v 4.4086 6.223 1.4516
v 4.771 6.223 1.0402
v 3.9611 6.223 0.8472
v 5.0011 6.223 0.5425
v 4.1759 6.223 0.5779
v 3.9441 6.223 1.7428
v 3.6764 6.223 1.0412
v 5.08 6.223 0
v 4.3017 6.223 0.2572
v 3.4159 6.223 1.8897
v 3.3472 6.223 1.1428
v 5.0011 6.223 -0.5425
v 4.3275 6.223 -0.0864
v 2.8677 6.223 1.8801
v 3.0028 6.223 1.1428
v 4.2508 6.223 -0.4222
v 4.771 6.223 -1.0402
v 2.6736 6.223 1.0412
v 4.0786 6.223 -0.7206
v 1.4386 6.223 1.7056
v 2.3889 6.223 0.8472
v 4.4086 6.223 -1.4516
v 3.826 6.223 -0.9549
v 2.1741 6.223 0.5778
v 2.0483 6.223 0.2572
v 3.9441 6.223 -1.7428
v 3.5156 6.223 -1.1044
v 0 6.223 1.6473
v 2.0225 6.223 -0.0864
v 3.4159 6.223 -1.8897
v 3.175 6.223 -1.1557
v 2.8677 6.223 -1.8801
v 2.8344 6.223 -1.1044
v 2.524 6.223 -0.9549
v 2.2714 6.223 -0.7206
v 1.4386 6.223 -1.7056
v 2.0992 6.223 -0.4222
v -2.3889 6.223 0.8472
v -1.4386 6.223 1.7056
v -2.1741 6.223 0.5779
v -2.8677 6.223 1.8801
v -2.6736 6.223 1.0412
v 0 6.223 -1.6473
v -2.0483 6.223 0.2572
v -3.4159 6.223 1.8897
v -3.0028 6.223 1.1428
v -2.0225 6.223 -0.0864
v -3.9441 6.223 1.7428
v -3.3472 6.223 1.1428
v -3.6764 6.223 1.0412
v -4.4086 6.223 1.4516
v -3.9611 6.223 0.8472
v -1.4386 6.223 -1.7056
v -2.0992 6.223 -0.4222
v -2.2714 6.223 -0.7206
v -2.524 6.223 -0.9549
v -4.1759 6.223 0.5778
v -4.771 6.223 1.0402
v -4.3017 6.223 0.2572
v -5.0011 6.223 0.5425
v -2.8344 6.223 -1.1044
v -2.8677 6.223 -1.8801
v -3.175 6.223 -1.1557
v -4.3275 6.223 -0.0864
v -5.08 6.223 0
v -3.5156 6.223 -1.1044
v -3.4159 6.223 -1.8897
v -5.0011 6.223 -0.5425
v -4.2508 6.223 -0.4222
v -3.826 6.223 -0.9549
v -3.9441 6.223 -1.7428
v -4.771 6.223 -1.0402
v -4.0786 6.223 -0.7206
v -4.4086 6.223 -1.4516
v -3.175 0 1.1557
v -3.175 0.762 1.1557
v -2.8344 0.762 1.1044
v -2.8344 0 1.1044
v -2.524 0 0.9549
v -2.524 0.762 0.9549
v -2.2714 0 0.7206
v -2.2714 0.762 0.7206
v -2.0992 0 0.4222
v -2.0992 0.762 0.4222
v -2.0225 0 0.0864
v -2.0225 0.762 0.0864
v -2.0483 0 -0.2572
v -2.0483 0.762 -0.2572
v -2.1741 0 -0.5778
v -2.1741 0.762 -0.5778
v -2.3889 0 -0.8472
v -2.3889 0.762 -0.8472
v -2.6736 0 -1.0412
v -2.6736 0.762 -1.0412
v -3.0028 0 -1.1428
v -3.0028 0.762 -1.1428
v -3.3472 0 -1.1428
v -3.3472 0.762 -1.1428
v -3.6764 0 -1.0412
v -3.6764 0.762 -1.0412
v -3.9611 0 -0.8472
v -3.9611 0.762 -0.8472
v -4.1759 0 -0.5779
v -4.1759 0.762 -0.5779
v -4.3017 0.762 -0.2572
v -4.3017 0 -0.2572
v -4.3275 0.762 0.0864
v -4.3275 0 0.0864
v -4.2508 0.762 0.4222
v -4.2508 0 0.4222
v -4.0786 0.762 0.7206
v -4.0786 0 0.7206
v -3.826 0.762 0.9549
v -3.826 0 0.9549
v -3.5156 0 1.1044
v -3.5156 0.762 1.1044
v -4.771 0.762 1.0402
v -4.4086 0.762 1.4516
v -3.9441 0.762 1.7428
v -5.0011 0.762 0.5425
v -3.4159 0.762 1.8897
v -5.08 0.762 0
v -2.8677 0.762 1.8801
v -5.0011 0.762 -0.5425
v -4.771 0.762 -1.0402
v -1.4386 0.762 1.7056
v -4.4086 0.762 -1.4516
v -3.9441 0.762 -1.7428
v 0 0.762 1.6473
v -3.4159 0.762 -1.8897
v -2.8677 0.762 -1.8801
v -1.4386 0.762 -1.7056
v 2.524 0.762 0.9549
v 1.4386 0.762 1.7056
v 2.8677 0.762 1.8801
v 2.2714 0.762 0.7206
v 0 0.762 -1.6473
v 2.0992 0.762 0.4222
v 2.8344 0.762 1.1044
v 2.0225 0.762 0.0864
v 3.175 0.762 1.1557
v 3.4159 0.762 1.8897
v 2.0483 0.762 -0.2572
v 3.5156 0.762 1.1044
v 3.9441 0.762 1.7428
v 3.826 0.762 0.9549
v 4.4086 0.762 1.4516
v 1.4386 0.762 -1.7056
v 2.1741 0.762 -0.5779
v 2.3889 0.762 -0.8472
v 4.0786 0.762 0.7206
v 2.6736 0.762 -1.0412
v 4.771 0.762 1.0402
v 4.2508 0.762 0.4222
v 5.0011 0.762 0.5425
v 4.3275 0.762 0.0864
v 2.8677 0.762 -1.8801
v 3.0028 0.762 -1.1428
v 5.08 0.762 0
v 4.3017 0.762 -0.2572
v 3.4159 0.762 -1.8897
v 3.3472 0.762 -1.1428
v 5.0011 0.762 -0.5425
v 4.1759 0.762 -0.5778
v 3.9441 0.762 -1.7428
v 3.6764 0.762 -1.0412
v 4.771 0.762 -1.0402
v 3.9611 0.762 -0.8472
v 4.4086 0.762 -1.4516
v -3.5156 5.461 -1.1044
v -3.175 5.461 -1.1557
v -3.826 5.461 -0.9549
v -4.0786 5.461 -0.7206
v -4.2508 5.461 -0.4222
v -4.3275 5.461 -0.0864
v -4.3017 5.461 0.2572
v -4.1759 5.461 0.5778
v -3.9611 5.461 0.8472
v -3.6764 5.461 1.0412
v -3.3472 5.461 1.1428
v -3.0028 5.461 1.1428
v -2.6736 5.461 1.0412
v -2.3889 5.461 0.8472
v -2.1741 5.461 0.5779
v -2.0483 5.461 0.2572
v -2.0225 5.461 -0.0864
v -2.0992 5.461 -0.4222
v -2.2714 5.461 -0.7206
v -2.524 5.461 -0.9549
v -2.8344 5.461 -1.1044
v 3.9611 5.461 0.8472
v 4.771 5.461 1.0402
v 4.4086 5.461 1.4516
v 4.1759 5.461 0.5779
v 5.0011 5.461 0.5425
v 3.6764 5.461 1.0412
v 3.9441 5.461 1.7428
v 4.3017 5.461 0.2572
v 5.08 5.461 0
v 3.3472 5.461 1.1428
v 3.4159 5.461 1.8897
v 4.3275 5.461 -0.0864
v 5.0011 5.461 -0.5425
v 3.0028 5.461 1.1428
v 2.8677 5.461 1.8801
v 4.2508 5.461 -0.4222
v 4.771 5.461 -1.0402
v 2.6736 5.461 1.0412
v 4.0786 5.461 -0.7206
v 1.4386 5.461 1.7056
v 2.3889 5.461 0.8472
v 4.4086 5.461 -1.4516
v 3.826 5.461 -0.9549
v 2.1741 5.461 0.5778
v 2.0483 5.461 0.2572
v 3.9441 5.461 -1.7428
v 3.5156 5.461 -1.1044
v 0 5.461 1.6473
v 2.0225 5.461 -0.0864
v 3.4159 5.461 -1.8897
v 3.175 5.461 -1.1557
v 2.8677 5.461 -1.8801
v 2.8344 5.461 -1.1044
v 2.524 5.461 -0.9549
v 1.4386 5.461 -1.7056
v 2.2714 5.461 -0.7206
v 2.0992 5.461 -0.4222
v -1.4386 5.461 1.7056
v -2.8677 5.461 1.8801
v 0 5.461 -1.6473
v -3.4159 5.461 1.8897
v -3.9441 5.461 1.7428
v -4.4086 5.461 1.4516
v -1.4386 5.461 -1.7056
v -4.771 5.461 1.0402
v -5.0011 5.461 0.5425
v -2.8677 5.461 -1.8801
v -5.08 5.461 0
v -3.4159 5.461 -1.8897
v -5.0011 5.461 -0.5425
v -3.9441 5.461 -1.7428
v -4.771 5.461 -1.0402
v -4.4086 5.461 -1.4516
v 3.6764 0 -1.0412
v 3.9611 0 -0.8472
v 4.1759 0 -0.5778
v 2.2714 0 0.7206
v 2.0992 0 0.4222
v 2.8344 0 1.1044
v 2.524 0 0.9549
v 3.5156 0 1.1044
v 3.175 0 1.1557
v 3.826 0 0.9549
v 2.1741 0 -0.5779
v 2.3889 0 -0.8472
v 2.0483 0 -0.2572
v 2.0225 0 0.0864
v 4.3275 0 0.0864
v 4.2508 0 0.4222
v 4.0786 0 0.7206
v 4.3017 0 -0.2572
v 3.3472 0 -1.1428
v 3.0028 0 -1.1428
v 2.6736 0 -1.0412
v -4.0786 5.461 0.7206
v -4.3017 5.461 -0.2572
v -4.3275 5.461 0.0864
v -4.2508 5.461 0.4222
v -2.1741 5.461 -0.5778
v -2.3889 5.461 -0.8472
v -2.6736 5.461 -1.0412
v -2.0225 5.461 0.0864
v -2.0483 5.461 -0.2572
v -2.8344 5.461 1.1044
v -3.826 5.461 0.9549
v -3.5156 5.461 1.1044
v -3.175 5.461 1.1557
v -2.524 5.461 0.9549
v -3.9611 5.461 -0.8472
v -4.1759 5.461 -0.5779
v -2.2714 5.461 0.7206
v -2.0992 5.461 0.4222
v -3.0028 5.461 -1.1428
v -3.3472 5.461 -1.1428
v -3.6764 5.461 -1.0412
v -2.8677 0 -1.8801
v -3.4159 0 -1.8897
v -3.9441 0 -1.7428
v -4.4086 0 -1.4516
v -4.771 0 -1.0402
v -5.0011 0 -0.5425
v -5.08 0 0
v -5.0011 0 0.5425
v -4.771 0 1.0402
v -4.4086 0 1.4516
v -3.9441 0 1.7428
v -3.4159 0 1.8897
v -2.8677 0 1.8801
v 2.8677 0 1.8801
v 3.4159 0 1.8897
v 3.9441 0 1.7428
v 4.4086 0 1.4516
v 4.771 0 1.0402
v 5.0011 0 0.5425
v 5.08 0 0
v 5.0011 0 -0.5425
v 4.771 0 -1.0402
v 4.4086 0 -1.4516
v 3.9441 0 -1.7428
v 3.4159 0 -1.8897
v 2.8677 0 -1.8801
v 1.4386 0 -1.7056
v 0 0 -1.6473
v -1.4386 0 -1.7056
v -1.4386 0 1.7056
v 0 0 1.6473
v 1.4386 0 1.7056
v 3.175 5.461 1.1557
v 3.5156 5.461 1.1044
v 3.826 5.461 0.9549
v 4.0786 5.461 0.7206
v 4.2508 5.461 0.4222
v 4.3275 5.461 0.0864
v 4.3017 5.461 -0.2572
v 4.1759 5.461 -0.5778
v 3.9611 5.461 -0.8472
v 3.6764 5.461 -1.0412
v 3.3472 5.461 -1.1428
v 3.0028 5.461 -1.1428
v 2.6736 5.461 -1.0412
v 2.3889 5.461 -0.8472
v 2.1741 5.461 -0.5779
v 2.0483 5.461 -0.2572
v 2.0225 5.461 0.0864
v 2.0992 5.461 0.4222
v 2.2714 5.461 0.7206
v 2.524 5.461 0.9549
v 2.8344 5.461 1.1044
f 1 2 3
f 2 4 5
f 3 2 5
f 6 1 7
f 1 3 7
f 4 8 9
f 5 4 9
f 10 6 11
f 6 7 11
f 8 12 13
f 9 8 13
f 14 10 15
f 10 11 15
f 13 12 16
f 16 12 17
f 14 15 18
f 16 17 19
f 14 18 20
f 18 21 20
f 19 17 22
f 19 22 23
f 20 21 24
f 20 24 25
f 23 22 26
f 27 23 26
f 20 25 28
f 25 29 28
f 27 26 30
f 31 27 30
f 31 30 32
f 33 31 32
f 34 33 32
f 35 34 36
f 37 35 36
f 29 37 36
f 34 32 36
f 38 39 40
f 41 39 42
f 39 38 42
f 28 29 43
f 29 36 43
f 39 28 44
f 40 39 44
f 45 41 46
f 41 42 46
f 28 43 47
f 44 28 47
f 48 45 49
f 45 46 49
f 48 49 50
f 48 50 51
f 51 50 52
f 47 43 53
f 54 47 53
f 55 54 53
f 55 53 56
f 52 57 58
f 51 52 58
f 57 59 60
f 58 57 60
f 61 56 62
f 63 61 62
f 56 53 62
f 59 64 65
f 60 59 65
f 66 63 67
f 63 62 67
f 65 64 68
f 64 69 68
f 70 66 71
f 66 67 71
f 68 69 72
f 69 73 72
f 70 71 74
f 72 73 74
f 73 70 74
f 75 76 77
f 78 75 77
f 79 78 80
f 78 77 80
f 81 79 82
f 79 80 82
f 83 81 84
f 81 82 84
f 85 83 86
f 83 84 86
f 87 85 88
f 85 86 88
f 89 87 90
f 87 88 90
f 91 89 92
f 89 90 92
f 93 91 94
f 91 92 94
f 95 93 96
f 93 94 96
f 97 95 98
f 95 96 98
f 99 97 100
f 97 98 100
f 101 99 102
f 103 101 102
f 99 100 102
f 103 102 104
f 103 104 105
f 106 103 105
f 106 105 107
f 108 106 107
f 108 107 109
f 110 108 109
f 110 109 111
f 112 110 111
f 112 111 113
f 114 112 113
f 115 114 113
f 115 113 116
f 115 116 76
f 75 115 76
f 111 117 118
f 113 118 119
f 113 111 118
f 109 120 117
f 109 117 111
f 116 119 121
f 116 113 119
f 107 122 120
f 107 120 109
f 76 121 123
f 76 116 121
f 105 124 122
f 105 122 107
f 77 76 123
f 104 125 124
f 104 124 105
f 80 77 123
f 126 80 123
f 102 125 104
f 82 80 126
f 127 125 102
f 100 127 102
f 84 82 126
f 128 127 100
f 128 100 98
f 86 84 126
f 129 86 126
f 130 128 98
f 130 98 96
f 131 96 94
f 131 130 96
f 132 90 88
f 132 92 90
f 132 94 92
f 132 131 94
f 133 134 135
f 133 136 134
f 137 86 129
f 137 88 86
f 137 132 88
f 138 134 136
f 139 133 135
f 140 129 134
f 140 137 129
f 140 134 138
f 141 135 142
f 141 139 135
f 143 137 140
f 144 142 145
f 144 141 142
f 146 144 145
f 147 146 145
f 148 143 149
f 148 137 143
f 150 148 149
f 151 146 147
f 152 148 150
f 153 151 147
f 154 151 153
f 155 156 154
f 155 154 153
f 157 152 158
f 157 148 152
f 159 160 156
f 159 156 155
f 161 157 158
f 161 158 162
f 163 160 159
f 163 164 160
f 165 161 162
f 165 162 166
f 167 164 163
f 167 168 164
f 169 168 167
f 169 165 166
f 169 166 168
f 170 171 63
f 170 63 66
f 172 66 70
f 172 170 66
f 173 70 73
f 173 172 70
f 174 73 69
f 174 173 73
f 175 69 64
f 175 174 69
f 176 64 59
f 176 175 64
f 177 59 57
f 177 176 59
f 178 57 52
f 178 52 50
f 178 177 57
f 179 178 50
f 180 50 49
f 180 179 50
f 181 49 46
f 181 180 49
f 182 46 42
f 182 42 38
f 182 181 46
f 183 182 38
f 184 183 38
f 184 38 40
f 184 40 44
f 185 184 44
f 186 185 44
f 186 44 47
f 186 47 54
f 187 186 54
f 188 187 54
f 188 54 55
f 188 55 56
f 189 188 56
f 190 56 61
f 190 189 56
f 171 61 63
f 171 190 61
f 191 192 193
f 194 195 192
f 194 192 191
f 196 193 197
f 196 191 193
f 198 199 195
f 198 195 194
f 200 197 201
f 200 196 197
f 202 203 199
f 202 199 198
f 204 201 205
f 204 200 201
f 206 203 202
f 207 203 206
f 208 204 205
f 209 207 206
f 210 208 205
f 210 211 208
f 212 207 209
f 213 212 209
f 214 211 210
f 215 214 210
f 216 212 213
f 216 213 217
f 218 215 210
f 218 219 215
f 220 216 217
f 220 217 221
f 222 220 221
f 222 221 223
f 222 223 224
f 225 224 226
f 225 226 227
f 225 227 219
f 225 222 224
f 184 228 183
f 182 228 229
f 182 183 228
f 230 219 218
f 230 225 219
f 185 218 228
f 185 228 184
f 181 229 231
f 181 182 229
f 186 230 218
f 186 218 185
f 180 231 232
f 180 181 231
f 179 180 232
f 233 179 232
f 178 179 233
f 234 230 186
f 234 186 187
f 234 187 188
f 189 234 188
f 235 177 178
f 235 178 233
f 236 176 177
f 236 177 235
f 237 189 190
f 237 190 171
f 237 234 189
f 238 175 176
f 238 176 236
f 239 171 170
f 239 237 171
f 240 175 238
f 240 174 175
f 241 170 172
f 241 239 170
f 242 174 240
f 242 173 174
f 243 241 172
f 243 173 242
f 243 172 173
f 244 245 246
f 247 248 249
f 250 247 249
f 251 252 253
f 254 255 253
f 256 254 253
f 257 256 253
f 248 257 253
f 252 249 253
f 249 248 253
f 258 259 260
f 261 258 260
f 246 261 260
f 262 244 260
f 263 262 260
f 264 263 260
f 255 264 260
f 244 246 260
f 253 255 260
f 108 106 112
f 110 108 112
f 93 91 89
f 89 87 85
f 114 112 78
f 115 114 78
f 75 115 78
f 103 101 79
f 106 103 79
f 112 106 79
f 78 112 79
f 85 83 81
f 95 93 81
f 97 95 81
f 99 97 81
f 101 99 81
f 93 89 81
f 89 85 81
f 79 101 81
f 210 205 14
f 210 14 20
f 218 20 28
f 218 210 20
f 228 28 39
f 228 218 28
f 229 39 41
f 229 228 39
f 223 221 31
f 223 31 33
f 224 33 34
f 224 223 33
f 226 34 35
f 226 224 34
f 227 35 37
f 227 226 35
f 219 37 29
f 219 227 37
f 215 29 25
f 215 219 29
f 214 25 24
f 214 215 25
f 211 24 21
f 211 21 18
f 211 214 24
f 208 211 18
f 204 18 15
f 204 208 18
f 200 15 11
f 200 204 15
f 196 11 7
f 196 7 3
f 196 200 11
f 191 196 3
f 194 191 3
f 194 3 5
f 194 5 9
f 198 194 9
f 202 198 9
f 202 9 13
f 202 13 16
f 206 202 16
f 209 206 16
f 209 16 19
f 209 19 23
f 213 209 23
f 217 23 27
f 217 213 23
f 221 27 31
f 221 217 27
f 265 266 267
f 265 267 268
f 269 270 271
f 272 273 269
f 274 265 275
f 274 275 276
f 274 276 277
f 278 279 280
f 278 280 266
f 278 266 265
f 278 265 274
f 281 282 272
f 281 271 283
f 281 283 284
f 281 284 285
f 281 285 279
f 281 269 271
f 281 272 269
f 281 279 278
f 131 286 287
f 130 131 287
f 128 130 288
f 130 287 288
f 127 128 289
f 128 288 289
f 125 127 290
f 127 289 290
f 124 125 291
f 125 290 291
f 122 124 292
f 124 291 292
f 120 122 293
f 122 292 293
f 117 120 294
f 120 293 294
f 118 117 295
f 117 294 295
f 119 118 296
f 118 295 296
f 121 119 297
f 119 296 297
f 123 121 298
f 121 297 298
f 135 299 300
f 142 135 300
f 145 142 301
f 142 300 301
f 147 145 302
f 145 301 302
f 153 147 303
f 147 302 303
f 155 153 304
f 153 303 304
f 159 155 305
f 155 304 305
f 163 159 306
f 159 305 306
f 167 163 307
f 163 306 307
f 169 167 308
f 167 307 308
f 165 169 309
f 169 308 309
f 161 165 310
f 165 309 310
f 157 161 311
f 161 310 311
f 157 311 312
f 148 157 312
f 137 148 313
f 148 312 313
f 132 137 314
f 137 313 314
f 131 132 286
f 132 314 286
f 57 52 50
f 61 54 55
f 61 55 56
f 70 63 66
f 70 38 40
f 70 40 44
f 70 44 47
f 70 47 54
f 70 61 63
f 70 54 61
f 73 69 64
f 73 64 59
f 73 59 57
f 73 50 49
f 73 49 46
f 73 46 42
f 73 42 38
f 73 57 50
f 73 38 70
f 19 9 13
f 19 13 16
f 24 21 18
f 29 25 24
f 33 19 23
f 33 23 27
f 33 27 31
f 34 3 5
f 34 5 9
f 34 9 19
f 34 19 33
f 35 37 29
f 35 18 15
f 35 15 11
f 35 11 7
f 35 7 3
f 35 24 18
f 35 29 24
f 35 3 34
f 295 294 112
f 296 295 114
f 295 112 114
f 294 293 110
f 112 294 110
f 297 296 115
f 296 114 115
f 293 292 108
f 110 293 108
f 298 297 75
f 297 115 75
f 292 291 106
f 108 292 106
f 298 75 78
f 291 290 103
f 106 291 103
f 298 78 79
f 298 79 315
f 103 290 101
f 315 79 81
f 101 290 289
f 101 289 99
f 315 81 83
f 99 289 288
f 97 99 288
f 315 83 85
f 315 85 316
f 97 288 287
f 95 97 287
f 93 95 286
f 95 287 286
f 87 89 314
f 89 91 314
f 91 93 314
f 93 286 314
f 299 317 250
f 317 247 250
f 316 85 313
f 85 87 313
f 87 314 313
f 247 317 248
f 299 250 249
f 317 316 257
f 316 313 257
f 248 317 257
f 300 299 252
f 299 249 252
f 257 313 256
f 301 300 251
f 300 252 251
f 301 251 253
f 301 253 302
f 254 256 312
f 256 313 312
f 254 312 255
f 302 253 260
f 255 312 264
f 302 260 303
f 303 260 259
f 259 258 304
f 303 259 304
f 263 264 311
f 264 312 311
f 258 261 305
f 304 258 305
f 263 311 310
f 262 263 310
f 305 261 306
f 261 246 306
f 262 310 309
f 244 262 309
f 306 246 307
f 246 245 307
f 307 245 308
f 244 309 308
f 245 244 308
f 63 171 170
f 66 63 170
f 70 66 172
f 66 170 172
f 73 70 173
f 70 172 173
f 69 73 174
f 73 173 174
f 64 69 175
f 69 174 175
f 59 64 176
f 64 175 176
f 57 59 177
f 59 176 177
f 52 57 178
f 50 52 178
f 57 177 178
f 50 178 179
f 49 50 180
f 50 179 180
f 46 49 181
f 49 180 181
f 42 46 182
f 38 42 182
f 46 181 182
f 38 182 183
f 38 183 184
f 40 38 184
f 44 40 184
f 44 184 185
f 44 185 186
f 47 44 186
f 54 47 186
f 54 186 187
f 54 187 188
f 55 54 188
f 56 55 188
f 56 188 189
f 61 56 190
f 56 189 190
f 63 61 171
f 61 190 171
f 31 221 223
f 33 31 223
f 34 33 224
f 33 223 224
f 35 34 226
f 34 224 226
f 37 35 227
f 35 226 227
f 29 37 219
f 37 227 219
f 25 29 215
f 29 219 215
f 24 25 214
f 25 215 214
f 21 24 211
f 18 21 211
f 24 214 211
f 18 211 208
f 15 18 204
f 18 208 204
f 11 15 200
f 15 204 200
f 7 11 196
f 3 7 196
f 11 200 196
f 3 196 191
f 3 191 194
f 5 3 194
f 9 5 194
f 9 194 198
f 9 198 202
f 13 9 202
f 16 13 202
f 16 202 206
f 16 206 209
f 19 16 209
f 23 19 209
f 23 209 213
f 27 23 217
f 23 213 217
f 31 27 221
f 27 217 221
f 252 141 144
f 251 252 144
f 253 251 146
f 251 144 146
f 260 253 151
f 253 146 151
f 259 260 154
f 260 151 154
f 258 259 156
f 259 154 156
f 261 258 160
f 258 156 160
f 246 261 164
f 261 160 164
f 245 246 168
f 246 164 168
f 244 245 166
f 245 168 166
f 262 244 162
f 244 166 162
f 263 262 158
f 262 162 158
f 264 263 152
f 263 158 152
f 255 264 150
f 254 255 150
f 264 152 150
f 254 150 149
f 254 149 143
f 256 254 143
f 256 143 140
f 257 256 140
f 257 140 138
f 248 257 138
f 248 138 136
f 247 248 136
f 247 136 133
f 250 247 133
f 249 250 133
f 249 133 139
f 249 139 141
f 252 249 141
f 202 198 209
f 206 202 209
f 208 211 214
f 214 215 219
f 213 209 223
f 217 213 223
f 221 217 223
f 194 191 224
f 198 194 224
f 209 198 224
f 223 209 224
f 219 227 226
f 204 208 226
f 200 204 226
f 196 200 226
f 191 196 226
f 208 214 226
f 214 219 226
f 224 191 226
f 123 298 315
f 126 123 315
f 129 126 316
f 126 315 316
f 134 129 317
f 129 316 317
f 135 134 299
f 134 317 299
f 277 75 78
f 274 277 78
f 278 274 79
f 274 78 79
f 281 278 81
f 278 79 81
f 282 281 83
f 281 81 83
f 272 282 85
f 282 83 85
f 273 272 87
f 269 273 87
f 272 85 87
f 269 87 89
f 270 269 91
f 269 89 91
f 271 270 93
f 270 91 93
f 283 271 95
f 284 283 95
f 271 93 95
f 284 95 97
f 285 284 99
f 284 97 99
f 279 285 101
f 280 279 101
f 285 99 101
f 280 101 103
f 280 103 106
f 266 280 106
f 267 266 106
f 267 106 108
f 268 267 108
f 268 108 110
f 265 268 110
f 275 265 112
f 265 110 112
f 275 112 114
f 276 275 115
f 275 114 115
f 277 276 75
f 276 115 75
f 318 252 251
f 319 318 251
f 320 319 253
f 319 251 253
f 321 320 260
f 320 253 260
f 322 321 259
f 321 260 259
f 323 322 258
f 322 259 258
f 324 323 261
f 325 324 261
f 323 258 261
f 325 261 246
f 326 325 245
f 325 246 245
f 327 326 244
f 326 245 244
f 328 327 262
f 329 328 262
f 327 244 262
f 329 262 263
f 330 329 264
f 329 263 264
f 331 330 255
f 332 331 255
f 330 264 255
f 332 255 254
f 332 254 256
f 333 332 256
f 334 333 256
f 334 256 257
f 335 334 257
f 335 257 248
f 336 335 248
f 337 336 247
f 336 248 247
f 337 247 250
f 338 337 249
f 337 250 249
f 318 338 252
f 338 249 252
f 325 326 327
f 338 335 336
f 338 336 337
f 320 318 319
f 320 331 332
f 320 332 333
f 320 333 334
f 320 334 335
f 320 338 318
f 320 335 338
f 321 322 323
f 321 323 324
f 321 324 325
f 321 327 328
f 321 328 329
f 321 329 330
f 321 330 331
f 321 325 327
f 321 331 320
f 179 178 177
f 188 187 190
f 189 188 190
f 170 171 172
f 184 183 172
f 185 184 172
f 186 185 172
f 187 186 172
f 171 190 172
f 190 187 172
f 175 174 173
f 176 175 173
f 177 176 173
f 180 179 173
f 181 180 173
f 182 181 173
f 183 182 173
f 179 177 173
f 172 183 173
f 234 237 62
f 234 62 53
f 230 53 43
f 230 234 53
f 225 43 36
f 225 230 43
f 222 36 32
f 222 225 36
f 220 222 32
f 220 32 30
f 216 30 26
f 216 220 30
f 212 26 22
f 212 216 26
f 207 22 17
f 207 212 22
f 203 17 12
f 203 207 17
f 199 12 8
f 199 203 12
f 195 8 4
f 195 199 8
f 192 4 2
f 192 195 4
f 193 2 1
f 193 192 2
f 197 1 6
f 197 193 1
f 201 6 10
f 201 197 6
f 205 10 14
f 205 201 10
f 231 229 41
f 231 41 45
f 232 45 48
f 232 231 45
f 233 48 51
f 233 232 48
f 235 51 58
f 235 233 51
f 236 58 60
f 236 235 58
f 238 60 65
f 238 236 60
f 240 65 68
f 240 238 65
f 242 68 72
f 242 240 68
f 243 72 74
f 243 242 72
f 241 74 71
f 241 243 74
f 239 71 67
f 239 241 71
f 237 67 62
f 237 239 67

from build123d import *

# Parameters (mm, degrees)
BOSS_EXTRUDE1_DEPTH        = 0.762
SKETCH2_R                  = 1.1557
CUT_EXTRUDE1_DEPTH         = 4.699
BOSS_EXTRUDE3_DEPTH        = 4.699
BOSS_EXTRUDE3_DEPTH_BACK   = 0.762
SKETCH2_2_R                = 1.1557
BOSS_EXTRUDE3_2_DEPTH      = 4.699
BOSS_EXTRUDE3_2_DEPTH_BACK = 0.762
SKETCH3_R                  = 1.1557
BOSS_EXTRUDE4_DEPTH        = 0.762
SKETCH4_R                  = 1.1557
BOSS_EXTRUDE6_DEPTH        = 0.762
BOSS_EXTRUDE6_2_DEPTH      = 0.762


with BuildPart() as part:
    # Sketch1 → Boss-Extrude1 (new body)
    with BuildSketch(Plane(origin=(0, 0, 0), x_dir=(1, 0, 0), z_dir=(0, 1, 0))):
        with BuildLine():
            ThreePointArc((-2.867741935, 1.88005784), (-5.08, 0), (-2.867741935, -1.88005784))
            ThreePointArc((-2.867741935, -1.88005784), (0, -1.647264347), (2.867741935, -1.88005784))
            ThreePointArc((2.867741935, -1.88005784), (5.08, 0), (2.867741935, 1.88005784))
            ThreePointArc((2.867741935, 1.88005784), (0, 1.647264347), (-2.867741935, 1.88005784))
        make_face()
    extrude(amount=BOSS_EXTRUDE1_DEPTH)

    # Sketch2 → Cut-Extrude1 (cut)
    with BuildSketch(Plane(origin=(0, 0.762, 0), x_dir=(1, 0, 0), z_dir=(0, 1, 0))):
        with Locations((3.175, 0)):
            Circle(SKETCH2_R)
        with Locations((-3.175, 0)):
            Circle(SKETCH2_R)
    extrude(amount=-CUT_EXTRUDE1_DEPTH, mode=Mode.SUBTRACT)


with BuildPart() as body_2:
    # Sketch2<2> → Boss-Extrude3 (new, two sides: drawn at the far end of the back side and taken through both)
    with BuildSketch(Plane(origin=(0, 0.762, 0), x_dir=(1, 0, 0), z_dir=(0, 1, 0)).offset(-BOSS_EXTRUDE3_DEPTH_BACK)):
        with Locations((3.175, 0)):
            Circle(SKETCH2_2_R)
    extrude(amount=BOSS_EXTRUDE3_DEPTH + BOSS_EXTRUDE3_DEPTH_BACK)


with BuildPart() as body_3:
    # Sketch2<2> → Boss-Extrude3 2 (new, two sides: drawn at the far end of the back side and taken through both)
    with BuildSketch(Plane(origin=(0, 0.762, 0), x_dir=(1, 0, 0), z_dir=(0, 1, 0)).offset(-BOSS_EXTRUDE3_2_DEPTH_BACK)):
        with Locations((-3.175, 0)):
            Circle(SKETCH2_2_R)
    extrude(amount=BOSS_EXTRUDE3_2_DEPTH + BOSS_EXTRUDE3_2_DEPTH_BACK)


with BuildPart() as body_4:
    # Sketch3 → Boss-Extrude4 (new body)
    with BuildSketch(Plane(origin=(0, 5.461, 0), x_dir=(1, 0, 0), z_dir=(0, 1, 0))):
        with BuildLine():
            ThreePointArc((-2.867741935, 1.88005784), (0, 1.647264347), (2.867741935, 1.88005784))
            ThreePointArc((2.867741935, 1.88005784), (5.08, 0), (2.867741935, -1.88005784))
            ThreePointArc((2.867741935, -1.88005784), (0, -1.647264347), (-2.867741935, -1.88005784))
            ThreePointArc((-2.867741935, -1.88005784), (-5.08, 0), (-2.867741935, 1.88005784))
        make_face()
        with Locations((3.175, 0)):
            Circle(SKETCH3_R, mode=Mode.SUBTRACT)
        with Locations((-3.175, 0)):
            Circle(SKETCH3_R, mode=Mode.SUBTRACT)
    extrude(amount=BOSS_EXTRUDE4_DEPTH)


with BuildPart() as body_5:
    # Sketch4 → Boss-Extrude6 (new body)
    with BuildSketch(Plane(origin=(0, 5.461, 0), x_dir=(1, 0, 0), z_dir=(0, 1, 0))):
        with Locations((3.175, 0)):
            Circle(SKETCH4_R)
    extrude(amount=BOSS_EXTRUDE6_DEPTH)


with BuildPart() as body_6:
    # Sketch4 → Boss-Extrude6 2 (new body)
    with BuildSketch(Plane(origin=(0, 5.461, 0), x_dir=(1, 0, 0), z_dir=(0, 1, 0))):
        with Locations((-3.175, 0)):
            Circle(SKETCH4_R)
    extrude(amount=BOSS_EXTRUDE6_2_DEPTH)


solid = Compound([part.part, body_2.part, body_3.part, body_4.part, body_5.part, body_6.part])
